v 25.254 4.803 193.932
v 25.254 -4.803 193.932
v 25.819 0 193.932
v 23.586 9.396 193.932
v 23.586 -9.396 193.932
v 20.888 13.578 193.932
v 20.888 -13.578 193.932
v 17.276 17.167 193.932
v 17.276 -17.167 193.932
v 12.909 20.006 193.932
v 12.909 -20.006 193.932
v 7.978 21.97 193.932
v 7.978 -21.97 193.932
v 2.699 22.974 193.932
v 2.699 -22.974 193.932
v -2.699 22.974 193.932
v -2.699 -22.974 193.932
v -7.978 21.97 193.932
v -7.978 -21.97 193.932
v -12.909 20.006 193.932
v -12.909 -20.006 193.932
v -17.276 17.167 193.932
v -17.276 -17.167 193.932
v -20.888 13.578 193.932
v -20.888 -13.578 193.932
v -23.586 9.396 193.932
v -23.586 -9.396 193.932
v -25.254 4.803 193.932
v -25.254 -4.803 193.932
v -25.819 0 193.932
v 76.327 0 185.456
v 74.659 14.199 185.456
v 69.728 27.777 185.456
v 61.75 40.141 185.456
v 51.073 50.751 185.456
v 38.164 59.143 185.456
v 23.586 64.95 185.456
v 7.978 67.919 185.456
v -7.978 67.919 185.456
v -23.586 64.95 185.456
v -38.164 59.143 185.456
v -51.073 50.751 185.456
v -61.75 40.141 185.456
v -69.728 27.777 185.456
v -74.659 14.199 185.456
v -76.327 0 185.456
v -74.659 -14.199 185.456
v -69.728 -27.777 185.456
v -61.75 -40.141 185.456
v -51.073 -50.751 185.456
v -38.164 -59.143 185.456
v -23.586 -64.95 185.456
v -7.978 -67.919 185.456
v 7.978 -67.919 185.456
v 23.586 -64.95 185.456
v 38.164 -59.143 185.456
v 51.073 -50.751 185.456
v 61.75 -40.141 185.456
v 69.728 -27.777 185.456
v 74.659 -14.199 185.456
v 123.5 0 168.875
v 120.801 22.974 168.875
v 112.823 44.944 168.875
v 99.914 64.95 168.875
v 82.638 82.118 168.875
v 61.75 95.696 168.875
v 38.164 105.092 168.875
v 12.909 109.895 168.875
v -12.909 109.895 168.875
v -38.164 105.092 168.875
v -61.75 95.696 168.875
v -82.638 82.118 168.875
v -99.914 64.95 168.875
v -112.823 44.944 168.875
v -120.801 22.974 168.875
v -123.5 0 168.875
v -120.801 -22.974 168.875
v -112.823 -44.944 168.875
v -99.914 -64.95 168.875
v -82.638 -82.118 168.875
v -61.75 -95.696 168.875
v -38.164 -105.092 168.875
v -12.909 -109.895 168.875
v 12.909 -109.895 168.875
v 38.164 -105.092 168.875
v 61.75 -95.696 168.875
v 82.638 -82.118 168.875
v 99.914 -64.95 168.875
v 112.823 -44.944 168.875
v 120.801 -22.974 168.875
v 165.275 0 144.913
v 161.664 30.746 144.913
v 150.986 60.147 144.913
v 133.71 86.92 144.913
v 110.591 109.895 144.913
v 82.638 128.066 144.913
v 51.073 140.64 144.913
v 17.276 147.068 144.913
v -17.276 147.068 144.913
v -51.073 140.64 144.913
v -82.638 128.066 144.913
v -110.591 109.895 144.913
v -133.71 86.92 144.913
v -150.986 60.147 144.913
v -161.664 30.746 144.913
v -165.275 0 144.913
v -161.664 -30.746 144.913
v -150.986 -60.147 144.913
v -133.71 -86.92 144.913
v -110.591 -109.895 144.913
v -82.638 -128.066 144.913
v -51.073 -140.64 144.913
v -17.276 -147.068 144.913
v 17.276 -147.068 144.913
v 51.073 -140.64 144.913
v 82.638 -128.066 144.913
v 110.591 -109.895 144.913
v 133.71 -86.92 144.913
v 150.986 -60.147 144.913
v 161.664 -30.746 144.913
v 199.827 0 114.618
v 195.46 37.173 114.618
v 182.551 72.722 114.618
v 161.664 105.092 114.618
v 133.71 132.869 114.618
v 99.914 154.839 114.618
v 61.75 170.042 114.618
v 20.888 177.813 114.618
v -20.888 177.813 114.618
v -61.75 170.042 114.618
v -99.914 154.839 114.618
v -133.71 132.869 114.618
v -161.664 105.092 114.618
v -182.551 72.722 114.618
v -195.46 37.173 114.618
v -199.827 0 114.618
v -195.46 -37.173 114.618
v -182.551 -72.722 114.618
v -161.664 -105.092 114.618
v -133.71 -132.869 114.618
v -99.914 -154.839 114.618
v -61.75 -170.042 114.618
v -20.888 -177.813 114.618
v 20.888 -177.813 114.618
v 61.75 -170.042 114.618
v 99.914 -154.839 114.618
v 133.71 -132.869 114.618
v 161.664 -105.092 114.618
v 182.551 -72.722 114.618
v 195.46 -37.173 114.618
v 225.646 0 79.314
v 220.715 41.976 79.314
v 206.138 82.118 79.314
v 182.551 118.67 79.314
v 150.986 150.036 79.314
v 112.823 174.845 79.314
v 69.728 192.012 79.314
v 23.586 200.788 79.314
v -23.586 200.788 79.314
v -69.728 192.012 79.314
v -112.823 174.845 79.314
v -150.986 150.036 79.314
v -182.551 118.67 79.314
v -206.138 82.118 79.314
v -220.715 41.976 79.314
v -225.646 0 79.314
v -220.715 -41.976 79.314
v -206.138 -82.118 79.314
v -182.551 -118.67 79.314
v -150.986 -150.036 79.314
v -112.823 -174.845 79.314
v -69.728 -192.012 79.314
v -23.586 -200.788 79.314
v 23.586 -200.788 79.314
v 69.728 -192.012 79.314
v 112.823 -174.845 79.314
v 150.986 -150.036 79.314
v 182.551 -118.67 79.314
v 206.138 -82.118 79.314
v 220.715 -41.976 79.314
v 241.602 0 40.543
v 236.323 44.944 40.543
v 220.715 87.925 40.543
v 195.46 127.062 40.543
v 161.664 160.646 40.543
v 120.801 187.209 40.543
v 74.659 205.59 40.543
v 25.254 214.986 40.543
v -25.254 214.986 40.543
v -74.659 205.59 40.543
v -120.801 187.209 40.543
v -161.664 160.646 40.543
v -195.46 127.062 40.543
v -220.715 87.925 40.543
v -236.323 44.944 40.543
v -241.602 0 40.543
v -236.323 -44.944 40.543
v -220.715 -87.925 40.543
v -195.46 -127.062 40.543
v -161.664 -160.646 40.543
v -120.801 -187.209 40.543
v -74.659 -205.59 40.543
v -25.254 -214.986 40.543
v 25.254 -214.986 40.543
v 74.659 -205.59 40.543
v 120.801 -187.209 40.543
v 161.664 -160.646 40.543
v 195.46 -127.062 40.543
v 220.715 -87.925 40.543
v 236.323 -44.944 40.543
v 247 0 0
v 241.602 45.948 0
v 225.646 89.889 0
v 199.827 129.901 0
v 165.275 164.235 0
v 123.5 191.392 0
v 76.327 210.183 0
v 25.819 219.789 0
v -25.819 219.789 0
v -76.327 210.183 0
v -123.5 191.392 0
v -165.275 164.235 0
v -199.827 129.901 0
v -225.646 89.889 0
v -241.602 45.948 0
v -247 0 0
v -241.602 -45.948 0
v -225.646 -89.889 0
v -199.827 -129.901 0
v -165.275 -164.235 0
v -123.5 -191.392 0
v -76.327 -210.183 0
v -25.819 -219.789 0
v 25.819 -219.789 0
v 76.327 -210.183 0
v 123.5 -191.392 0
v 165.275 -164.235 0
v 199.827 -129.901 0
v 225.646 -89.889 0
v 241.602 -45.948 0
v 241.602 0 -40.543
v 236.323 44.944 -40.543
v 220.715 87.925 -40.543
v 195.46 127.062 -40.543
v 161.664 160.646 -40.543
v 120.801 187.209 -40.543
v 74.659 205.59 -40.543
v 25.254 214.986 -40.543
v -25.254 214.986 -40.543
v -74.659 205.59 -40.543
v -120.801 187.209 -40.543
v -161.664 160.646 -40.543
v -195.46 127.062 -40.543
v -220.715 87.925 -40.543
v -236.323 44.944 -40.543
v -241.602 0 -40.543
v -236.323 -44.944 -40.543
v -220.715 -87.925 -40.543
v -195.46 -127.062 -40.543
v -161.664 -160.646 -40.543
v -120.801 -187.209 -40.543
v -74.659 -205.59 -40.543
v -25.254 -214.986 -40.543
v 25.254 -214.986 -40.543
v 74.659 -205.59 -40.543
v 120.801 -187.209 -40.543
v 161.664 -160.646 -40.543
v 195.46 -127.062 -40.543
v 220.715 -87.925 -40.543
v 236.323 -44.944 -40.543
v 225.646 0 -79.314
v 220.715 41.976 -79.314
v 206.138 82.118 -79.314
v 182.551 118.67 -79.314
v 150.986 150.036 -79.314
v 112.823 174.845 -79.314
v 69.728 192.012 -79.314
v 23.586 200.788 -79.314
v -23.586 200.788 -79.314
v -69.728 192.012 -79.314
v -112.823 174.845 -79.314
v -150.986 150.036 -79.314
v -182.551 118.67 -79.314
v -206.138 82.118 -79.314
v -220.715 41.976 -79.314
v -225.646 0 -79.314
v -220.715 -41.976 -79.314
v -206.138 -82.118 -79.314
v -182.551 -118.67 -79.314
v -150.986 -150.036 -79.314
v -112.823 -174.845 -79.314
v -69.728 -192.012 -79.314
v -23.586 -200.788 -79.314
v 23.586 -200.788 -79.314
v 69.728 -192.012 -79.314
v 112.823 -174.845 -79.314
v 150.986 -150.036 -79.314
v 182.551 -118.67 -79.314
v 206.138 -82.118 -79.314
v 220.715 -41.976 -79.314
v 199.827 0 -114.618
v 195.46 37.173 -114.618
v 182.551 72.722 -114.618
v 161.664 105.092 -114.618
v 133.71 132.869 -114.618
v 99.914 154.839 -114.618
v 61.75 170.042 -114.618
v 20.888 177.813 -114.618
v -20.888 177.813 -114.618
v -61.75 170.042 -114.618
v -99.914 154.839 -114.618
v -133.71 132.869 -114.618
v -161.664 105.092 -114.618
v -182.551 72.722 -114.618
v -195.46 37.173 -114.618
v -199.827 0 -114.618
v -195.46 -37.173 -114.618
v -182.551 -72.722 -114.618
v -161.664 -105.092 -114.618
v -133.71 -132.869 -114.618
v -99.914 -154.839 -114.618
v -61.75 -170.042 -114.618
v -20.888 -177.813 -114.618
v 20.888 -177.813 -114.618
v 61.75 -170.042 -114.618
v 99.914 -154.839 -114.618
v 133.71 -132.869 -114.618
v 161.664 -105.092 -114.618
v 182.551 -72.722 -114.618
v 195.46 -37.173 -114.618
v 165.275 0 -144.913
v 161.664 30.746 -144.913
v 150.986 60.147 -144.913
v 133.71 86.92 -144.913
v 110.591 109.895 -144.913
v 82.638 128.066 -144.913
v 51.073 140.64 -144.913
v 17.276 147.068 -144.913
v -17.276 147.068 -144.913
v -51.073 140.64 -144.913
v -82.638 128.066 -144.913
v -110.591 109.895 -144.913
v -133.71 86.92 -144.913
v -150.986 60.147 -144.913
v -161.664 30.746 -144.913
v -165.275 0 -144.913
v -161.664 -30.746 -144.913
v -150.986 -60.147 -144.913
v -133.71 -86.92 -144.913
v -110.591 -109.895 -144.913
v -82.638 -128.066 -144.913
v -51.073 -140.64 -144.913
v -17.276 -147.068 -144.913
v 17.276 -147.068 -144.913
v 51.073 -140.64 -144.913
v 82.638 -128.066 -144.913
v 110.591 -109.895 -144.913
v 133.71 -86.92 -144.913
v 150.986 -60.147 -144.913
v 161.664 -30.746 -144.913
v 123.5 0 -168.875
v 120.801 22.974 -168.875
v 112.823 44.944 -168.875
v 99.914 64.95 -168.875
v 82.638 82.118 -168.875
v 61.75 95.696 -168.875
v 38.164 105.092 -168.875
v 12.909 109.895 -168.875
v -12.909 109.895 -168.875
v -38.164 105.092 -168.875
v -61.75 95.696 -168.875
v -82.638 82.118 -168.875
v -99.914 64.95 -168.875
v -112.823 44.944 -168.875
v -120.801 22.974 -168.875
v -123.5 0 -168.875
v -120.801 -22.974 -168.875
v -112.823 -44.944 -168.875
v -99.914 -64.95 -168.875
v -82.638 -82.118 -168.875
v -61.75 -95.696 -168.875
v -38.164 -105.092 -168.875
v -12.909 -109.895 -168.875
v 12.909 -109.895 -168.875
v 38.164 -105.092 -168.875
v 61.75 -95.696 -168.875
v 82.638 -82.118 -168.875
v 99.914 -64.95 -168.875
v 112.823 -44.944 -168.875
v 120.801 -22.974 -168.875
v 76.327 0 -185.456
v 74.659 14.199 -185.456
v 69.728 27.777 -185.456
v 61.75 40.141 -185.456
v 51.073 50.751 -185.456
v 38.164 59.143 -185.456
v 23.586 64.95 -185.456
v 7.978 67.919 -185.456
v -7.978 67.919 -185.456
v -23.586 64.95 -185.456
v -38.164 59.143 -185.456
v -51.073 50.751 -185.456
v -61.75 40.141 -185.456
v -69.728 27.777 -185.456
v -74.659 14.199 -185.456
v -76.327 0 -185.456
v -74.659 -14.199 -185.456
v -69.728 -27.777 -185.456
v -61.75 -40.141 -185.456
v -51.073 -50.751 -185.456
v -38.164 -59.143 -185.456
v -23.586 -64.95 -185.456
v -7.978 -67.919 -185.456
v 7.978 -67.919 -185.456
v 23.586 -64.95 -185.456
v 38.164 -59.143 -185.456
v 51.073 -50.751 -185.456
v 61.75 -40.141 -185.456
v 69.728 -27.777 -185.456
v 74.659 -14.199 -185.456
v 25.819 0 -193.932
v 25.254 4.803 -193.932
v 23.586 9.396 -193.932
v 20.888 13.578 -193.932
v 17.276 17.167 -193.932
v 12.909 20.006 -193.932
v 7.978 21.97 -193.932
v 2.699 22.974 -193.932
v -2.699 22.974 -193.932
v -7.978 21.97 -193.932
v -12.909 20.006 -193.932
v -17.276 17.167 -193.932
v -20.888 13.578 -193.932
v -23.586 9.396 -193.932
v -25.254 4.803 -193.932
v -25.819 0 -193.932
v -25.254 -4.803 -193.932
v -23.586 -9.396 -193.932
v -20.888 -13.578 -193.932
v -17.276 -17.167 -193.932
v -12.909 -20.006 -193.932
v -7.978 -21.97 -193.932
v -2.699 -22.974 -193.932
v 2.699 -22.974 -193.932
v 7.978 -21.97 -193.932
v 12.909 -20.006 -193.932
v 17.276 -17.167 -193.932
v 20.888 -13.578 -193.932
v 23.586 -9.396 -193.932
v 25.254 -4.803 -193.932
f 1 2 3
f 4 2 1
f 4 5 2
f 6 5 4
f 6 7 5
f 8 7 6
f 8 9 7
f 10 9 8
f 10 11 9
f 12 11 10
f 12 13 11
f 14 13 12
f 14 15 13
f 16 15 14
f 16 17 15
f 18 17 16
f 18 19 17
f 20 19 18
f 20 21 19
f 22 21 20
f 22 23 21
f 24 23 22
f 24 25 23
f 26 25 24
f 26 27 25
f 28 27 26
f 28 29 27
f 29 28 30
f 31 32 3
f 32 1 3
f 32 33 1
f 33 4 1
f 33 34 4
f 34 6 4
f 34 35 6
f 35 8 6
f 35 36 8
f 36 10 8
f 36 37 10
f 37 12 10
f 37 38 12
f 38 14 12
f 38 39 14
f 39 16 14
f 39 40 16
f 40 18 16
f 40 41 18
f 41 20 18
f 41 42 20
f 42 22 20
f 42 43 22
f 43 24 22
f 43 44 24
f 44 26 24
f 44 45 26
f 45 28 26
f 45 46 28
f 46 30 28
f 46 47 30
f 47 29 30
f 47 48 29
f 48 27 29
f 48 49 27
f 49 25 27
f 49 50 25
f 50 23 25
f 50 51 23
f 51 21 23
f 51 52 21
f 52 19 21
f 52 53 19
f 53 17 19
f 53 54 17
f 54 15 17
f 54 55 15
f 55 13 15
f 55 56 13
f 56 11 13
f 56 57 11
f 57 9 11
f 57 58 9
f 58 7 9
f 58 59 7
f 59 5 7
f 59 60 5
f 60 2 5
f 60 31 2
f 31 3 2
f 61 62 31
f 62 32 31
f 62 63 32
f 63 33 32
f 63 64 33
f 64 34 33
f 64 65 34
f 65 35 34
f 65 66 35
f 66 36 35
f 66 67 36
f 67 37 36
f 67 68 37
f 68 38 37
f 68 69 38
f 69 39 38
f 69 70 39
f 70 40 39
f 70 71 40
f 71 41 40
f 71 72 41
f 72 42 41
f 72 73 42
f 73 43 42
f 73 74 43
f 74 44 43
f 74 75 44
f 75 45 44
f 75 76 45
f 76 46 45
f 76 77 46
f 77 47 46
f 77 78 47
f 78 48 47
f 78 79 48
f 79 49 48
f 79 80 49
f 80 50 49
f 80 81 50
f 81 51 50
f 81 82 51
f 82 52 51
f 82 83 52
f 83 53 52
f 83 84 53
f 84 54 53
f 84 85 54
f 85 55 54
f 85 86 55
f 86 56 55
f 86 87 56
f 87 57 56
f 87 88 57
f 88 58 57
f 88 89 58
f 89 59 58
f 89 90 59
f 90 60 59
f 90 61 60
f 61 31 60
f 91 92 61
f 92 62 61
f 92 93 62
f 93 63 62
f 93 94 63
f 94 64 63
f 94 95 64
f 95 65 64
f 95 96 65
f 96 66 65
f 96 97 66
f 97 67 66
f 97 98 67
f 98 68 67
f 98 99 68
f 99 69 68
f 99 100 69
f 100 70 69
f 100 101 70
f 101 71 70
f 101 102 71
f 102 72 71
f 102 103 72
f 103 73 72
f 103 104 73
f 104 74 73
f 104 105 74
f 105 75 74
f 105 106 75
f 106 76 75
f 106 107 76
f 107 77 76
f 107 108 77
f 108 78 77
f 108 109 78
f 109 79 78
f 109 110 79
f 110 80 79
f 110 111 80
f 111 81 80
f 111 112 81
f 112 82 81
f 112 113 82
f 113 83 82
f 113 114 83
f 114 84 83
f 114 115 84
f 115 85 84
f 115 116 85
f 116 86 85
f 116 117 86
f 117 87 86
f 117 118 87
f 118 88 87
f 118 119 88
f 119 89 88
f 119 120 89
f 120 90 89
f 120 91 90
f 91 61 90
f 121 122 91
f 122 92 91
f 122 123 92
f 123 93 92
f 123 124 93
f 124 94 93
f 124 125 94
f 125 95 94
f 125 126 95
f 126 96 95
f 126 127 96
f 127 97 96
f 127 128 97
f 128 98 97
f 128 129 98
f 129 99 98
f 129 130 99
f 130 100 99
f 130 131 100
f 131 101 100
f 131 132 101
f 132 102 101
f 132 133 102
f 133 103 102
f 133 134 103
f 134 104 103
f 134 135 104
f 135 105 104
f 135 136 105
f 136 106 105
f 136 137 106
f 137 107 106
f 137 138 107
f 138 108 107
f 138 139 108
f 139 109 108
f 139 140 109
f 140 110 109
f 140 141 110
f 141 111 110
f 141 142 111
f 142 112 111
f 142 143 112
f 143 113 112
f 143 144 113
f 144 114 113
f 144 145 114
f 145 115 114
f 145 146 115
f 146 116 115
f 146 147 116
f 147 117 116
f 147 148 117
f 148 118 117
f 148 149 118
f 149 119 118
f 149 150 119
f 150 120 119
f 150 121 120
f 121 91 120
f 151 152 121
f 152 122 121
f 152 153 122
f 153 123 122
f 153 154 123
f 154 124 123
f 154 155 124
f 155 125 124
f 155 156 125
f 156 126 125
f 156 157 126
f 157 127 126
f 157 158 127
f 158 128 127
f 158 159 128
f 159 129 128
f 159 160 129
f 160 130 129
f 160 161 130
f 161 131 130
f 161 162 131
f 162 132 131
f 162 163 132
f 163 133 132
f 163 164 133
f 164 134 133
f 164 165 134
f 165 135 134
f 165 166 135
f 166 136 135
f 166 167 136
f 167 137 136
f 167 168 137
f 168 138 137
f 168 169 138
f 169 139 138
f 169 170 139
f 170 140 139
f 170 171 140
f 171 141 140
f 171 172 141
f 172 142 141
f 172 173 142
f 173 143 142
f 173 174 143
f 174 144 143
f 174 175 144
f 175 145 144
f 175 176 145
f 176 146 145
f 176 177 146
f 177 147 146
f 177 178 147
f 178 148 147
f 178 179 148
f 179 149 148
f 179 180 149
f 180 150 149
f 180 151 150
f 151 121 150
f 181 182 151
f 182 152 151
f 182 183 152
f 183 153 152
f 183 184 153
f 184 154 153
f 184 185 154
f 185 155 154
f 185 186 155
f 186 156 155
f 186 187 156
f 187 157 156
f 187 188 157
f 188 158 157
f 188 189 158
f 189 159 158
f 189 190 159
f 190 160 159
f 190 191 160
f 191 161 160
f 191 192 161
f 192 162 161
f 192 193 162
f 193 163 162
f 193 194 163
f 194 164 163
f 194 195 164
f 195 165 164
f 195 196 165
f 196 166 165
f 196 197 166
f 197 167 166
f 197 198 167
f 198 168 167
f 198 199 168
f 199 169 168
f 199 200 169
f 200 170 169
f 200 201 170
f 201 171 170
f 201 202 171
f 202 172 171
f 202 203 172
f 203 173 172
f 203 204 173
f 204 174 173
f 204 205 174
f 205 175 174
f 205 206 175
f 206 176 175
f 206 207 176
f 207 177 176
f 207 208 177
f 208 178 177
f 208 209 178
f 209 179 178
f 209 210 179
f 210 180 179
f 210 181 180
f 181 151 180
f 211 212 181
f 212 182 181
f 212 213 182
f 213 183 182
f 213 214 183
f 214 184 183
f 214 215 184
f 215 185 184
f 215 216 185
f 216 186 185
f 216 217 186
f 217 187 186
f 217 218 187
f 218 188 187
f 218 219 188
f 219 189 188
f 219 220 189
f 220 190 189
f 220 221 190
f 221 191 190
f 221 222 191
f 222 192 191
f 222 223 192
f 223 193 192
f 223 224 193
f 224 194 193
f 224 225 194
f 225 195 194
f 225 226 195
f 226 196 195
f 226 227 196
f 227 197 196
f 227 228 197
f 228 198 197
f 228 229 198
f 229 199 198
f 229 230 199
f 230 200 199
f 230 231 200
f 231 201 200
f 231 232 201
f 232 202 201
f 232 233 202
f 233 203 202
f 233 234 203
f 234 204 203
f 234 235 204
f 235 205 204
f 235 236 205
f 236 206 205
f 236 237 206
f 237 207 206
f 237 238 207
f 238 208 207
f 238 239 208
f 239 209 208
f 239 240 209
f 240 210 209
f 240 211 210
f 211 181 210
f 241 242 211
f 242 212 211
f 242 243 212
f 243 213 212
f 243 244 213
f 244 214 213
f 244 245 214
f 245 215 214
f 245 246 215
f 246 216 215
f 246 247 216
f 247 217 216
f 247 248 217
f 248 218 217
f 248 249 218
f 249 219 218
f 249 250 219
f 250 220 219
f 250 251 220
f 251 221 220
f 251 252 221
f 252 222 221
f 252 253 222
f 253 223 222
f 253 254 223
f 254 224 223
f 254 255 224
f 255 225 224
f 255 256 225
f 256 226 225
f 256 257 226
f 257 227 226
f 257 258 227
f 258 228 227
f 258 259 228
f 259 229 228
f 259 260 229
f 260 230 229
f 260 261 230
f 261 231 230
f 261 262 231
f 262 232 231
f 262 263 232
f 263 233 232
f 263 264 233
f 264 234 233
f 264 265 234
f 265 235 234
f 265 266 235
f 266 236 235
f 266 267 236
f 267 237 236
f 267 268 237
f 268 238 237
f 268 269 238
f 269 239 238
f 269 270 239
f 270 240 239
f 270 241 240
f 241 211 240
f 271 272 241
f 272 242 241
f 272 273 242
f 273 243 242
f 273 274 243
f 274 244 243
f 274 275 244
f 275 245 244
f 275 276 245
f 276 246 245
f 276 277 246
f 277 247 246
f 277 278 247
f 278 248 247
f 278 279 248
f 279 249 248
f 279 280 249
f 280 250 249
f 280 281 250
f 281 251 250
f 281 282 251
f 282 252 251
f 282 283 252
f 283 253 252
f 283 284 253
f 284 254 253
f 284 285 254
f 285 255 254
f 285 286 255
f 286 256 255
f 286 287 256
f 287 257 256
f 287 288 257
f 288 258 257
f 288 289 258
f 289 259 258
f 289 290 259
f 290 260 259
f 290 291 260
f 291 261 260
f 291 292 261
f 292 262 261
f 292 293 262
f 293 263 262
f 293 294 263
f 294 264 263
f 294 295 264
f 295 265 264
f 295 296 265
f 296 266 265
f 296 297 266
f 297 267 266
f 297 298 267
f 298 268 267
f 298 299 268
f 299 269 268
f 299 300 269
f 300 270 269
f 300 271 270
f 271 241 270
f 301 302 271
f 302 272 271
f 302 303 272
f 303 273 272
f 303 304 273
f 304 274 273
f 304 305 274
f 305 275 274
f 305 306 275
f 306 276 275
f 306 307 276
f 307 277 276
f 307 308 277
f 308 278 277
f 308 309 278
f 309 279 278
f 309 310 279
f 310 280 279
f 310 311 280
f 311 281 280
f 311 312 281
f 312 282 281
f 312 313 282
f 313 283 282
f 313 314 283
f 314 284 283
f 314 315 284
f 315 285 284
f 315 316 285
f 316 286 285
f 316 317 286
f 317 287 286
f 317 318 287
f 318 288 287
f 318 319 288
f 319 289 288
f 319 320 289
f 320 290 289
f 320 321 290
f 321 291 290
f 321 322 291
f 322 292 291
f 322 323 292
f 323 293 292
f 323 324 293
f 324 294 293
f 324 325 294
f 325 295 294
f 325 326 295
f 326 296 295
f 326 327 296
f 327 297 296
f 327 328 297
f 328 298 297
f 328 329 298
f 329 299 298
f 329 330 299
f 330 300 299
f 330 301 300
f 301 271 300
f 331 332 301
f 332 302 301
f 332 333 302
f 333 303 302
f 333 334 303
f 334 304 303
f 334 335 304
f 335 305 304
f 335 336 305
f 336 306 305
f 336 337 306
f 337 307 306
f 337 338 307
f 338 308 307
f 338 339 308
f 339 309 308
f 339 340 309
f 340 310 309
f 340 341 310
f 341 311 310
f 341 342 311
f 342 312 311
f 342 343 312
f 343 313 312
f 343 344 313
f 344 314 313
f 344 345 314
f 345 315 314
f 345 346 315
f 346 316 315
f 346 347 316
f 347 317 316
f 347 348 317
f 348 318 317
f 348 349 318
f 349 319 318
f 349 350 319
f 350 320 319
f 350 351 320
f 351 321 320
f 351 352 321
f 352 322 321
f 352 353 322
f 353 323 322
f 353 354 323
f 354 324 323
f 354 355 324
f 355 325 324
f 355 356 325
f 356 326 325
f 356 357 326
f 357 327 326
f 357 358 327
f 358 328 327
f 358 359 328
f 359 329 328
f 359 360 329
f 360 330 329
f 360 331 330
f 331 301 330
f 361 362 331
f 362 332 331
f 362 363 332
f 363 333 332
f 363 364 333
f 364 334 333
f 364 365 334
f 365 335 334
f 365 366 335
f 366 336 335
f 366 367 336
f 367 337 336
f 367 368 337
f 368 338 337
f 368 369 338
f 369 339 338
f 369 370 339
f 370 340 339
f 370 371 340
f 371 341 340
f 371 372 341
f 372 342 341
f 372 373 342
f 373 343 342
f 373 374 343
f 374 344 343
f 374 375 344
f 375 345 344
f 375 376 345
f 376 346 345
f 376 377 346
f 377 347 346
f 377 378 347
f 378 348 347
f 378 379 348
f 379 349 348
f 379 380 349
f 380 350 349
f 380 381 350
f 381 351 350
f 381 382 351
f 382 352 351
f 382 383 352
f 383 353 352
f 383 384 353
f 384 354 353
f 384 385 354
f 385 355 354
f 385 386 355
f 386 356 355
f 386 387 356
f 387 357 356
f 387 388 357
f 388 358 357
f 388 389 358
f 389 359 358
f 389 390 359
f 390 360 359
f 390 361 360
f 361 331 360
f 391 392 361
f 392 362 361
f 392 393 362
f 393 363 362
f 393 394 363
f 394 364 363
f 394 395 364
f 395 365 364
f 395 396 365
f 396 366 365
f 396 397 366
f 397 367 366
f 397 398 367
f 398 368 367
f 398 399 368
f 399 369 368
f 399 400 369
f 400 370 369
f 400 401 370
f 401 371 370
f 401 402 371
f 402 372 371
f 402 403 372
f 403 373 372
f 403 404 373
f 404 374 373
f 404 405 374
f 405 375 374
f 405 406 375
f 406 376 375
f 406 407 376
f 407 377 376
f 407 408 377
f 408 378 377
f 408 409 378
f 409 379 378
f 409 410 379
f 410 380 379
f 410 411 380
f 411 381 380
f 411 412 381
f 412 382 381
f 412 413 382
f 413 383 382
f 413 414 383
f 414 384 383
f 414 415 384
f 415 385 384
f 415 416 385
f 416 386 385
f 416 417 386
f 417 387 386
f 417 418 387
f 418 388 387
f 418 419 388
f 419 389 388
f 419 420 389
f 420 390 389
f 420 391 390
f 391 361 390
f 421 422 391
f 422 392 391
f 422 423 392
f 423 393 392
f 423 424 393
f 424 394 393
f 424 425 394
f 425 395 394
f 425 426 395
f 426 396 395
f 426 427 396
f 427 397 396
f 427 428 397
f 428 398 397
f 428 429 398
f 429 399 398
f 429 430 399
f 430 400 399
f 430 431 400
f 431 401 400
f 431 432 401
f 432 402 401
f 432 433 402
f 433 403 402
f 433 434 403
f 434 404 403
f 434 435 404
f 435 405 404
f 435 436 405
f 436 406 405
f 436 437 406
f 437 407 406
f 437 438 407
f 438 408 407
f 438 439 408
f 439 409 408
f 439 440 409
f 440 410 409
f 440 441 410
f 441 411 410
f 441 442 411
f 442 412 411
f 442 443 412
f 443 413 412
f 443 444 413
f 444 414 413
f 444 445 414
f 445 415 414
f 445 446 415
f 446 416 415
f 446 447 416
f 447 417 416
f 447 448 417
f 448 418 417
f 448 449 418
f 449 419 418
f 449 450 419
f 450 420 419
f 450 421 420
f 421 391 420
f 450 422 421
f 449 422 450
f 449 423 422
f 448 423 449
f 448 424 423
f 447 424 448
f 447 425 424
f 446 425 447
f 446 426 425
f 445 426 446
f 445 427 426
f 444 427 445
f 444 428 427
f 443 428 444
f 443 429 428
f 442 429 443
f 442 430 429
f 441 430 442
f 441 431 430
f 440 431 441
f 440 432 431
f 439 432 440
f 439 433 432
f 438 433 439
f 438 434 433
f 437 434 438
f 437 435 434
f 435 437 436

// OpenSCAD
// Generated by SolidPython 1.0.1 on 2020-07-29 00:46:54


scale(v = [19, 17, 15]) {
	sphere(r = 13);
}
/***********************************************
*********      SolidPython code:      **********
************************************************
 
# import packages: SolidPython
from solid import *
from solid.utils import *
from itertools import chain, combinations, permutations


class Resize:

    def __init__(self, scad_file):
        self.scad_file = scad_file
        #self.scad_file = import_scad(scad_file)
        # cone/cylinder param:
        self.r1 = 0
        self.r2 = 0
        self.h = 0
        # rectangular prism param:
        self.w = 0
        self.l = 0
        # ellipse param:
        self.r = 0

    # import OpenScad code (file name corresponds to shape)


    # classify shape + parameters
    def assign(self, param1, param2, param3):
        if self.scad_file == 'cone.scad':
            self.r1 = param1
            self.r2 = param2
            self.h = param3
        elif self.scad_file == 'cylinder.scad':
            self.r1 = param1
            self.r2 = param2
            self.h = param3
        elif self.scad_file == 'rectangularPrism.scad':
            self.h = param1
            self.l = param2
            self.w = param3
        else:
            self.r = param1
            self.h = param2

    # resize parameters
    def iterate(self):
        x = range(3, 20, 2)
        i = 1
        if self.scad_file == 'cone.scad':
            tempList = list(permutations(x, 2))
            for temp in tempList:
                param1 = temp[0]
                param2 = temp[1]
                filepath = 'produced_scad_files/' + 'cone' + str(param1) + '_' + str(param2) + '_' + '.scad'
                scad_render_to_file(cylinder(h=param1, r1=param2, r2=0), filepath)

        elif self.scad_file == 'cylinder.scad':
            tempList = list(permutations(x, 3))
            for temp in tempList:
                param1 = temp[0]
                param2 = temp[1]
                filepath = 'produced_scad_files/' + 'cylinder' + str(param1) + '_' + str(param2) + '_' + '.scad'
                scad_render_to_file(cylinder(h=param1, r1=param2, r2=param2), filepath)

        elif self.scad_file == 'rectangularPrism.scad':
            tempList = list(permutations(x, 3))
            for temp in tempList:
                param1 = temp[0]
                param2 = temp[1]
                param3 = temp[2]
                filepath = 'produced_scad_files/' + 'rectangularPrism' + str(param1) + '_' + str(param2) + '_' + str(
                    param3) + '.scad'
                scad_render_to_file(cube(size=(param1, param2, param3)), filepath)

        elif self.scad_file == 'ellipse.scad':
            tempList = list(permutations(x, 4))
            for temp in tempList:
                param1 = temp[0]
                param2 = temp[1]
                param3 = temp[2]
                param4 = temp[3]
                filepath = 'produced_scad_files/' + 'ellipse' + str(param1) + '_' + str(param2) + '_' + str(param3) + '_' + str(param4) + '.scad'
                scad_render_to_file(scale([param1, param2, param3])(sphere(r=param4)), filepath)

    def render_to_scadfile(self):
        scad_render_to_file(scad, 'example.scad') 
 
************************************************/
